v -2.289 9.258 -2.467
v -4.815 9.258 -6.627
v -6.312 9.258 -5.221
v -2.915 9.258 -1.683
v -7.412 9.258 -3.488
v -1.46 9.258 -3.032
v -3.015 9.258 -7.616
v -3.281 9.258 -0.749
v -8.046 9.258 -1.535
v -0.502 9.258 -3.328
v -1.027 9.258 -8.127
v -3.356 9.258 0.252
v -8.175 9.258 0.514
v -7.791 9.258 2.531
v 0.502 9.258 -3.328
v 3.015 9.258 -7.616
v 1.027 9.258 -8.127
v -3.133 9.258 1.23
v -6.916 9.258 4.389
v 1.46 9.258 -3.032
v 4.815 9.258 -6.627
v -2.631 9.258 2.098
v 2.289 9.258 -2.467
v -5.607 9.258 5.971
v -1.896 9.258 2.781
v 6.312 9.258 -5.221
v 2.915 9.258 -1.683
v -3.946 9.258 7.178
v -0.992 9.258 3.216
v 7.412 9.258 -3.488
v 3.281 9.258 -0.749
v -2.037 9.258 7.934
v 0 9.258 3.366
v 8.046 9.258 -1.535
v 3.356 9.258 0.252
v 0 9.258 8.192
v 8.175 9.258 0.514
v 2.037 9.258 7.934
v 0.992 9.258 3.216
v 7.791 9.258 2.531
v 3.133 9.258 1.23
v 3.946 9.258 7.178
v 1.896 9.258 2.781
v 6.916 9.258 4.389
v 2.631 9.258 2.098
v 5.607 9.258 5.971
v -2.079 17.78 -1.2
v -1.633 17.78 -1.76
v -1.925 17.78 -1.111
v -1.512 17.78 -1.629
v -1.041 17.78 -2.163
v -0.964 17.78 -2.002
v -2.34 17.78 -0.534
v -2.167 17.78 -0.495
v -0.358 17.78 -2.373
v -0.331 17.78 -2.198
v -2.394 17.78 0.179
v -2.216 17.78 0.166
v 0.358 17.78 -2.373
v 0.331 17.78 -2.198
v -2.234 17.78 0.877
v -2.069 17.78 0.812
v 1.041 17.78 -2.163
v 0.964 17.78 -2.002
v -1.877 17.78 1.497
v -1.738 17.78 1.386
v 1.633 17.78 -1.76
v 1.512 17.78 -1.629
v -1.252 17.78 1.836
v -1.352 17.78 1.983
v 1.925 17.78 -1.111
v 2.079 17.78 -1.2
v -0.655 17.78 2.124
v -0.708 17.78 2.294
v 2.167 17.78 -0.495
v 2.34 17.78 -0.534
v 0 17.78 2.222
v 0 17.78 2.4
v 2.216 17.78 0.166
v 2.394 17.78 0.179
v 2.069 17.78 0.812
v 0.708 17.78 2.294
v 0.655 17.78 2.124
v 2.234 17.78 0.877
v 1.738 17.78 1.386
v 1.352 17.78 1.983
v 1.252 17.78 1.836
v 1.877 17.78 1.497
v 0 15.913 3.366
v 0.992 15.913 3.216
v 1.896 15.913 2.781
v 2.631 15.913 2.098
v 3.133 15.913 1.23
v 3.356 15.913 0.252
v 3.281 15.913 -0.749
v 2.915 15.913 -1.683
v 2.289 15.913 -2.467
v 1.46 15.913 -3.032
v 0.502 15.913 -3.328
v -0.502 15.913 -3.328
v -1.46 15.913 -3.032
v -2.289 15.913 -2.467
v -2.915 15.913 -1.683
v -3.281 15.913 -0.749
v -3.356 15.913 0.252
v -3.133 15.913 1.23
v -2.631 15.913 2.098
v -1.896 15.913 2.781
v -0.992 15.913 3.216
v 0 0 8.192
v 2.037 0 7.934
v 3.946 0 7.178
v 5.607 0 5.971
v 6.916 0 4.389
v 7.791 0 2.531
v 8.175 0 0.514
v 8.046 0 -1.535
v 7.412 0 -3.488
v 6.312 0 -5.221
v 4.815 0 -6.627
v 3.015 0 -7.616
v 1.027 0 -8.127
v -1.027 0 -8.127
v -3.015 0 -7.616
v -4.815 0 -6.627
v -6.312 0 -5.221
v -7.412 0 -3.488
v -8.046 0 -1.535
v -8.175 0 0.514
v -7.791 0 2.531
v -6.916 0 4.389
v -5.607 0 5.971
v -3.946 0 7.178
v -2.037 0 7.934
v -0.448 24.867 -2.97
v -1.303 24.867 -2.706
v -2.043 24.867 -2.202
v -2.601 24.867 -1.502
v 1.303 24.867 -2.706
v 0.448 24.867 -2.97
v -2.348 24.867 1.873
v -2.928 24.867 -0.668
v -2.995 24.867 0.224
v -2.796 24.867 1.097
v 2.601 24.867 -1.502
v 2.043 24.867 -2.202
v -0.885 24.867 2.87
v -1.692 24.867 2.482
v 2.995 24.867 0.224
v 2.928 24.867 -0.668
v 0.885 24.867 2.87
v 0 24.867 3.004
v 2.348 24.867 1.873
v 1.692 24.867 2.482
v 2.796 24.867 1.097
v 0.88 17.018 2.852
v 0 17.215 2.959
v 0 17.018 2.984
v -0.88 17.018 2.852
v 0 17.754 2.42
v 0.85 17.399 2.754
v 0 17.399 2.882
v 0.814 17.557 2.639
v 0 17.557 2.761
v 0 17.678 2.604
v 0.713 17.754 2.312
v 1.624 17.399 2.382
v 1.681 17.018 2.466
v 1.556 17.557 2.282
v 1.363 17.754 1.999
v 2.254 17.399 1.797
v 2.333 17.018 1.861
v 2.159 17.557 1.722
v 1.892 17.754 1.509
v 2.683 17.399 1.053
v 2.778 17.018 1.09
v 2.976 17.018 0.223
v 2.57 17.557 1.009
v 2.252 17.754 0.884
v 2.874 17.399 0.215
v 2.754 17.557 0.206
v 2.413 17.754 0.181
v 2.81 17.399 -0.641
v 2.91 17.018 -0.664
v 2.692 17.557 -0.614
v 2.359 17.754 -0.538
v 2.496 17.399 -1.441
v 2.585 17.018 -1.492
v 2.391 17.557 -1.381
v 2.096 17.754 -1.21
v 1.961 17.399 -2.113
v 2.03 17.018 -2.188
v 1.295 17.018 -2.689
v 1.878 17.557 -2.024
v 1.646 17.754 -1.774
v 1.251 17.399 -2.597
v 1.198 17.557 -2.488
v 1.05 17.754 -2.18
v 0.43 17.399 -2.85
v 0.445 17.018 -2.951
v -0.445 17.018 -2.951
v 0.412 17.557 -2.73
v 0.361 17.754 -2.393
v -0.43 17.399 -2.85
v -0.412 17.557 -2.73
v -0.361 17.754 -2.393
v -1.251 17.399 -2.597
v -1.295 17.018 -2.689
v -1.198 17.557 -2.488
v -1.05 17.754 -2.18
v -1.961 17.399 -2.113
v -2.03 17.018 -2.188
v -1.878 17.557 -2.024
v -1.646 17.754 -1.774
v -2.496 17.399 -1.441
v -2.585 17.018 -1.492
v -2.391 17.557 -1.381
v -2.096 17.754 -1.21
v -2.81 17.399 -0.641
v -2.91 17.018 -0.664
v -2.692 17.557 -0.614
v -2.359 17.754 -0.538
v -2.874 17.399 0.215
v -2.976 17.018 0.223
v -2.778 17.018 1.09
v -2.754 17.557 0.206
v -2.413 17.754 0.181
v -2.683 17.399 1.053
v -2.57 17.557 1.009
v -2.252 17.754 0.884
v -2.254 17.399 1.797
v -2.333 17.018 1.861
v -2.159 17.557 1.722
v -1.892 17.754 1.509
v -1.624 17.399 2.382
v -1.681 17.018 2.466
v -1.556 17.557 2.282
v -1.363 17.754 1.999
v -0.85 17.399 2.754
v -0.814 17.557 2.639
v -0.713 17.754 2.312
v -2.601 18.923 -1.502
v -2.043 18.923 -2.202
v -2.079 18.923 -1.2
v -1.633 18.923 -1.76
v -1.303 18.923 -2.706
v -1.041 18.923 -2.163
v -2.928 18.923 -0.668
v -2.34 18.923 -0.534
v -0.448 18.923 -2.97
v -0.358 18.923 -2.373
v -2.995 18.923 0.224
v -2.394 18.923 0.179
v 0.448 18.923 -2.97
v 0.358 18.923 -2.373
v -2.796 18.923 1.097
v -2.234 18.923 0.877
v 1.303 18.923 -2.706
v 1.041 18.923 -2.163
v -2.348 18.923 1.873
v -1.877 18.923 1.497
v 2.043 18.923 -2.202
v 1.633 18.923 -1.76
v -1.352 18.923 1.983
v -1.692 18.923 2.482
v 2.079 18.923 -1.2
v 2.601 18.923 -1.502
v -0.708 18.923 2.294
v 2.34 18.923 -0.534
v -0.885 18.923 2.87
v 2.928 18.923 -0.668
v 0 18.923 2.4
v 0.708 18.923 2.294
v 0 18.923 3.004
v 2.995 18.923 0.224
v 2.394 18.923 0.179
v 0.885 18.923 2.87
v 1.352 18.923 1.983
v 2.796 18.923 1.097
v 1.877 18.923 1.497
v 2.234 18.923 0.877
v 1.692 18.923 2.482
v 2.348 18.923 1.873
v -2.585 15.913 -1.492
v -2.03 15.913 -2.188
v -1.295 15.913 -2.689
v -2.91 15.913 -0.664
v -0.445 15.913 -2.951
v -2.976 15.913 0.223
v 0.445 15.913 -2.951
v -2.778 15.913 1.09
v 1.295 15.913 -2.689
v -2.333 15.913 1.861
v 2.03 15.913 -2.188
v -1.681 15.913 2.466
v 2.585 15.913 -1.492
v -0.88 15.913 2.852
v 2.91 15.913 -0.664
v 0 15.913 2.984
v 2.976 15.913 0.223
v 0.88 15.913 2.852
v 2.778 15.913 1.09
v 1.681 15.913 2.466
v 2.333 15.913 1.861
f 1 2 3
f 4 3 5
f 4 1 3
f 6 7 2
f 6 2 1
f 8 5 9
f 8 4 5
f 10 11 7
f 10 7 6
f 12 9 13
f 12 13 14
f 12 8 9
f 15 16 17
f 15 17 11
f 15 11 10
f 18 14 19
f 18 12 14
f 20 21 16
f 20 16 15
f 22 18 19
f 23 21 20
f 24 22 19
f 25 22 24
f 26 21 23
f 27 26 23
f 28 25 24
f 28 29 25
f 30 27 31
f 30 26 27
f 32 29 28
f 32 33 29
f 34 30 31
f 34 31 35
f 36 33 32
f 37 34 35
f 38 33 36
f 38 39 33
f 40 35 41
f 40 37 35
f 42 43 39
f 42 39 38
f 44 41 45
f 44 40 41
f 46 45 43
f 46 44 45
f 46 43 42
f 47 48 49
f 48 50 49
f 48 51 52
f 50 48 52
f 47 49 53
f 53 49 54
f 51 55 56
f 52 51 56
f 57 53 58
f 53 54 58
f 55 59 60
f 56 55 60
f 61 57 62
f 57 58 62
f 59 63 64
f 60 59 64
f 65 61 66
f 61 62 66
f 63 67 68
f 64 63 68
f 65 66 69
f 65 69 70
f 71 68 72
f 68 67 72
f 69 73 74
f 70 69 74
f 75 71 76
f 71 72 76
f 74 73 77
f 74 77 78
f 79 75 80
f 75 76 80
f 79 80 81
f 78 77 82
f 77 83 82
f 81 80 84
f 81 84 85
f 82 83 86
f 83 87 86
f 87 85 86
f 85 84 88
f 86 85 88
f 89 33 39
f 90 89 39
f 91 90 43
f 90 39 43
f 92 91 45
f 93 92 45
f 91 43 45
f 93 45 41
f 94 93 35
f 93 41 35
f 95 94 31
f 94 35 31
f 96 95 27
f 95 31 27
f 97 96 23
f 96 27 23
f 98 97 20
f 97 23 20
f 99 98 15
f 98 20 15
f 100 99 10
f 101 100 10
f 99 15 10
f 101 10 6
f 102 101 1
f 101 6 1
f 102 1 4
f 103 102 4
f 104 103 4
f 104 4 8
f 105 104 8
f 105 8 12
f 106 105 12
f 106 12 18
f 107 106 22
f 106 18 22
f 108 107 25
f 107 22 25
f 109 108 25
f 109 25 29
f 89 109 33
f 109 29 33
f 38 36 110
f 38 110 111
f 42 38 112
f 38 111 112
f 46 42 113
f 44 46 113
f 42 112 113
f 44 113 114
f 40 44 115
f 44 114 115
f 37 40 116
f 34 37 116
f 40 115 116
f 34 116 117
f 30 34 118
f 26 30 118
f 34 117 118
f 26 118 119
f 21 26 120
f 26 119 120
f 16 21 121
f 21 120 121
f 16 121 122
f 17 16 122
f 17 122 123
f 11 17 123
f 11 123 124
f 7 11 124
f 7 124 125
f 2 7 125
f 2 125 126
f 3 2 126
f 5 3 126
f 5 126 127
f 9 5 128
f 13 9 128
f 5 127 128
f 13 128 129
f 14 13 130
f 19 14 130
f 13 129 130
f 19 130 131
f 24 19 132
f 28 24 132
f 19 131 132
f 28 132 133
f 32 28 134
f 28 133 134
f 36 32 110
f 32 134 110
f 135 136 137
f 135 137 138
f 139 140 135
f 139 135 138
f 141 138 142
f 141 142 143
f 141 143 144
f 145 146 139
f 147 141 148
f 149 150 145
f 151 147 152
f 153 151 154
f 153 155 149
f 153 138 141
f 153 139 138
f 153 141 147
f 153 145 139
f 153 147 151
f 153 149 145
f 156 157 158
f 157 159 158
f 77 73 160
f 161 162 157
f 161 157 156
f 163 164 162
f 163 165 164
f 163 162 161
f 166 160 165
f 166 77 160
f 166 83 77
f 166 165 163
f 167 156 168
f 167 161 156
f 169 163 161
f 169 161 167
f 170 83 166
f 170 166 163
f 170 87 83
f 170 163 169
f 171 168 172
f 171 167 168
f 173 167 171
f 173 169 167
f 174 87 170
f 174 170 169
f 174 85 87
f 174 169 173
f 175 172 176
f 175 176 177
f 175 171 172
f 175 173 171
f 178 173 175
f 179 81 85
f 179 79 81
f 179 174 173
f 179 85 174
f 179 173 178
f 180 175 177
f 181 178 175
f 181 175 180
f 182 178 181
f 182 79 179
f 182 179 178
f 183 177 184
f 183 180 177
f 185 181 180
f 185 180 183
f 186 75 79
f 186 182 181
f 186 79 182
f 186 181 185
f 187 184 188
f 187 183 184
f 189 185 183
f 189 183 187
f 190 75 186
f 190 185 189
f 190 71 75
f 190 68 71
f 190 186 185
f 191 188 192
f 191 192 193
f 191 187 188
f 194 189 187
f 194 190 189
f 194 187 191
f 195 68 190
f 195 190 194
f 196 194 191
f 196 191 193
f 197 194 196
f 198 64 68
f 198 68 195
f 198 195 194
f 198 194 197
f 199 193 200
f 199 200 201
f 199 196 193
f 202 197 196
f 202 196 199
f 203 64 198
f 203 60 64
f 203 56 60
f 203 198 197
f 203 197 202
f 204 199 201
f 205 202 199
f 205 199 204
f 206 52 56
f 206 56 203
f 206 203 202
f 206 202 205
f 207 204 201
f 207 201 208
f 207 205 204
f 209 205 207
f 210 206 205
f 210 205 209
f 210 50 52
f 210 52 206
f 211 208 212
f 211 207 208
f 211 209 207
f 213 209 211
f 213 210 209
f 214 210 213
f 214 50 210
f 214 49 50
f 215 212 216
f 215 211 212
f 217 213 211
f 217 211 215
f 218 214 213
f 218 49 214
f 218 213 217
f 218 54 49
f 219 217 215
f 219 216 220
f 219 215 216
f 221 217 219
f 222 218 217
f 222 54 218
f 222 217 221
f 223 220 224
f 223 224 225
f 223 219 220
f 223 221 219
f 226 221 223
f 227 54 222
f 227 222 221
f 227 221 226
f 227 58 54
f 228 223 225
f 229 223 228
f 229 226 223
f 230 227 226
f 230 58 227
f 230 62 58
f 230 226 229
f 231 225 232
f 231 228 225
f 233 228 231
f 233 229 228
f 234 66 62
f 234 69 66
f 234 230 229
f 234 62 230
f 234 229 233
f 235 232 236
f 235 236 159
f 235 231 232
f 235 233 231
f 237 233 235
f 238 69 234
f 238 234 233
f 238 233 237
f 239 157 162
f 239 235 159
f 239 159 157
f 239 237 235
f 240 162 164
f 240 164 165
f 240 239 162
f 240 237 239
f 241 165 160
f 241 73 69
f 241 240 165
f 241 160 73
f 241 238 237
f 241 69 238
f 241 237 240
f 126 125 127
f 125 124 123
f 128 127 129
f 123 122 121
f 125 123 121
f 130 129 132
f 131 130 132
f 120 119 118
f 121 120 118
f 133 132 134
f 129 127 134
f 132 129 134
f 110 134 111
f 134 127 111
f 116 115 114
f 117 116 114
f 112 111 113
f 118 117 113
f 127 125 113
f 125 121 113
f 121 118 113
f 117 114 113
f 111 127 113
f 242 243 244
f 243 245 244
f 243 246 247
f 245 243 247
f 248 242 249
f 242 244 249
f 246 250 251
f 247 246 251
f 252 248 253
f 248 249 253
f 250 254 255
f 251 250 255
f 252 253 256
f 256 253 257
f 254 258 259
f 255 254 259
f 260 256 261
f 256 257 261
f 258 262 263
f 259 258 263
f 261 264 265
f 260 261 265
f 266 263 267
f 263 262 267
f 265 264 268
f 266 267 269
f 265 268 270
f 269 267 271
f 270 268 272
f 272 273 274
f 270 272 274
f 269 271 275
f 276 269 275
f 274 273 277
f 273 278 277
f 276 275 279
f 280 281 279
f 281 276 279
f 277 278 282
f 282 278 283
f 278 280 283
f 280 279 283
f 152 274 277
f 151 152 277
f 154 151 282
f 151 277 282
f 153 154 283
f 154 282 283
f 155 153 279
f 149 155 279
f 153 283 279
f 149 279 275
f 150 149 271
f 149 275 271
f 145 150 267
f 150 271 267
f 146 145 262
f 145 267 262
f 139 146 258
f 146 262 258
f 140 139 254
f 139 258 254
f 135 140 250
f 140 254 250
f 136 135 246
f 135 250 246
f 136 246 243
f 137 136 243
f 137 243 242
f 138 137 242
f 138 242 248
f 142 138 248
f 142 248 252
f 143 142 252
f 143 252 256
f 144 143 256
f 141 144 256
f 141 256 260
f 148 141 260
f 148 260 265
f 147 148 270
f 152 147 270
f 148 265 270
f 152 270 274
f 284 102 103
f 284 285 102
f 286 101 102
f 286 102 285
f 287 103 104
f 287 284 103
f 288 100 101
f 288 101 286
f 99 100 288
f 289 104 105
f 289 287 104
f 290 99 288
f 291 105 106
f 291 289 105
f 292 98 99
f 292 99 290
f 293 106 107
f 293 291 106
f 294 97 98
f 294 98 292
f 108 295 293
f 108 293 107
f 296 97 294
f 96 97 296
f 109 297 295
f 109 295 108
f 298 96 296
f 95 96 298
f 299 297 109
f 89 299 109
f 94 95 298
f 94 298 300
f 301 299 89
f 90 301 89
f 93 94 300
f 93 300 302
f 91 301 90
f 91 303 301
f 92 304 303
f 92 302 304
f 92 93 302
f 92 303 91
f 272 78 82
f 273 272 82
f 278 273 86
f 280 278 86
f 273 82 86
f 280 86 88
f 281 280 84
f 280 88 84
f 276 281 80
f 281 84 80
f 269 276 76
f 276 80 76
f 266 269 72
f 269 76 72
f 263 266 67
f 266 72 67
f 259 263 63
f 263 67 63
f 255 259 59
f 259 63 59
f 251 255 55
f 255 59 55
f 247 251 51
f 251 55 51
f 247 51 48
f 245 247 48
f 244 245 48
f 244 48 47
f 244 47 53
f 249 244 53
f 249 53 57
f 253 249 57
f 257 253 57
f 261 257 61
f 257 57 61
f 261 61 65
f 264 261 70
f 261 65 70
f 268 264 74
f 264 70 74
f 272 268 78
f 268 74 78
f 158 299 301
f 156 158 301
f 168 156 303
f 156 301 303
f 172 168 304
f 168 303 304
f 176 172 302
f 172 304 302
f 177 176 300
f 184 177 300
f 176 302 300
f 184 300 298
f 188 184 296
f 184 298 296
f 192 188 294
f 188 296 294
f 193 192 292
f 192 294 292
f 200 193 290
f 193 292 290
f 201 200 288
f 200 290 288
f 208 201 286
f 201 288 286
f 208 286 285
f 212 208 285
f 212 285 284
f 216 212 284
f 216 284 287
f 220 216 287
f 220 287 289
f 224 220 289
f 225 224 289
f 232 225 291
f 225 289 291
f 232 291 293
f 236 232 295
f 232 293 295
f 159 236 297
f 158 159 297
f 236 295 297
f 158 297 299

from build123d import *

# Parameters (mm, degrees)
SKETCH2_R           = 8.1915
BOSS_EXTRUDE1_DEPTH = 9.2583
SKETCH4_R           = 3.3655
BOSS_EXTRUDE3_DEPTH = 6.6548
SKETCH5_R           = 2.9845
BOSS_EXTRUDE4_DEPTH = 1.8669
FILLET1_R           = 0.762
SKETCH7_R           = 2.4003
BOSS_EXTRUDE5_DEPTH = 1.143
SKETCH8_R           = 3.00355
BOSS_EXTRUDE6_DEPTH = 5.9436


with BuildPart() as part:
    # Sketch2 → Boss-Extrude1 (new body)
    with BuildSketch(Plane(origin=(0, 0, 0), x_dir=(1, 0, 0), z_dir=(0, 1, 0))):
        with Locations(Location((0, 0, 0), (0, 0, 270))):
            Circle(SKETCH2_R)
    extrude(amount=BOSS_EXTRUDE1_DEPTH)

    # Sketch4 → Boss-Extrude3 (add)
    with BuildSketch(Plane(origin=(0, 9.2583, 0), x_dir=(1, 0, 0), z_dir=(0, 1, 0))):
        with Locations(Location((0, 0, 0), (0, 0, 270))):
            Circle(SKETCH4_R)
    extrude(amount=BOSS_EXTRUDE3_DEPTH)

    # Sketch5 → Boss-Extrude4 (add)
    with BuildSketch(Plane(origin=(0, 15.9131, 0), x_dir=(1, 0, 0), z_dir=(0, 1, 0))):
        with Locations(Location((0, 0, 0), (0, 0, 270))):
            Circle(SKETCH5_R)
    extrude(amount=BOSS_EXTRUDE4_DEPTH)

    # Fillet1
    fillet1_edges = [part.edges().sort_by_distance(p)[0] for p in [
        (0, 17.78, -2.9845),
    ]]
    fillet(fillet1_edges, radius=FILLET1_R)

    # Sketch7 → Boss-Extrude5 (add)
    with BuildSketch(Plane(origin=(0, 17.78, 0), x_dir=(1, 0, 0), z_dir=(0, 1, 0))):
        with Locations(Location((0, 0, 0), (0, 0, 270))):
            Circle(SKETCH7_R)
    extrude(amount=BOSS_EXTRUDE5_DEPTH)

    # Sketch8 → Boss-Extrude6 (add)
    with BuildSketch(Plane(origin=(0, 18.923, 0), x_dir=(1, 0, 0), z_dir=(0, 1, 0))):
        with Locations(Location((0, 0, 0), (0, 0, 270))):
            Circle(SKETCH8_R)
    extrude(amount=BOSS_EXTRUDE6_DEPTH)


solid = part.part
